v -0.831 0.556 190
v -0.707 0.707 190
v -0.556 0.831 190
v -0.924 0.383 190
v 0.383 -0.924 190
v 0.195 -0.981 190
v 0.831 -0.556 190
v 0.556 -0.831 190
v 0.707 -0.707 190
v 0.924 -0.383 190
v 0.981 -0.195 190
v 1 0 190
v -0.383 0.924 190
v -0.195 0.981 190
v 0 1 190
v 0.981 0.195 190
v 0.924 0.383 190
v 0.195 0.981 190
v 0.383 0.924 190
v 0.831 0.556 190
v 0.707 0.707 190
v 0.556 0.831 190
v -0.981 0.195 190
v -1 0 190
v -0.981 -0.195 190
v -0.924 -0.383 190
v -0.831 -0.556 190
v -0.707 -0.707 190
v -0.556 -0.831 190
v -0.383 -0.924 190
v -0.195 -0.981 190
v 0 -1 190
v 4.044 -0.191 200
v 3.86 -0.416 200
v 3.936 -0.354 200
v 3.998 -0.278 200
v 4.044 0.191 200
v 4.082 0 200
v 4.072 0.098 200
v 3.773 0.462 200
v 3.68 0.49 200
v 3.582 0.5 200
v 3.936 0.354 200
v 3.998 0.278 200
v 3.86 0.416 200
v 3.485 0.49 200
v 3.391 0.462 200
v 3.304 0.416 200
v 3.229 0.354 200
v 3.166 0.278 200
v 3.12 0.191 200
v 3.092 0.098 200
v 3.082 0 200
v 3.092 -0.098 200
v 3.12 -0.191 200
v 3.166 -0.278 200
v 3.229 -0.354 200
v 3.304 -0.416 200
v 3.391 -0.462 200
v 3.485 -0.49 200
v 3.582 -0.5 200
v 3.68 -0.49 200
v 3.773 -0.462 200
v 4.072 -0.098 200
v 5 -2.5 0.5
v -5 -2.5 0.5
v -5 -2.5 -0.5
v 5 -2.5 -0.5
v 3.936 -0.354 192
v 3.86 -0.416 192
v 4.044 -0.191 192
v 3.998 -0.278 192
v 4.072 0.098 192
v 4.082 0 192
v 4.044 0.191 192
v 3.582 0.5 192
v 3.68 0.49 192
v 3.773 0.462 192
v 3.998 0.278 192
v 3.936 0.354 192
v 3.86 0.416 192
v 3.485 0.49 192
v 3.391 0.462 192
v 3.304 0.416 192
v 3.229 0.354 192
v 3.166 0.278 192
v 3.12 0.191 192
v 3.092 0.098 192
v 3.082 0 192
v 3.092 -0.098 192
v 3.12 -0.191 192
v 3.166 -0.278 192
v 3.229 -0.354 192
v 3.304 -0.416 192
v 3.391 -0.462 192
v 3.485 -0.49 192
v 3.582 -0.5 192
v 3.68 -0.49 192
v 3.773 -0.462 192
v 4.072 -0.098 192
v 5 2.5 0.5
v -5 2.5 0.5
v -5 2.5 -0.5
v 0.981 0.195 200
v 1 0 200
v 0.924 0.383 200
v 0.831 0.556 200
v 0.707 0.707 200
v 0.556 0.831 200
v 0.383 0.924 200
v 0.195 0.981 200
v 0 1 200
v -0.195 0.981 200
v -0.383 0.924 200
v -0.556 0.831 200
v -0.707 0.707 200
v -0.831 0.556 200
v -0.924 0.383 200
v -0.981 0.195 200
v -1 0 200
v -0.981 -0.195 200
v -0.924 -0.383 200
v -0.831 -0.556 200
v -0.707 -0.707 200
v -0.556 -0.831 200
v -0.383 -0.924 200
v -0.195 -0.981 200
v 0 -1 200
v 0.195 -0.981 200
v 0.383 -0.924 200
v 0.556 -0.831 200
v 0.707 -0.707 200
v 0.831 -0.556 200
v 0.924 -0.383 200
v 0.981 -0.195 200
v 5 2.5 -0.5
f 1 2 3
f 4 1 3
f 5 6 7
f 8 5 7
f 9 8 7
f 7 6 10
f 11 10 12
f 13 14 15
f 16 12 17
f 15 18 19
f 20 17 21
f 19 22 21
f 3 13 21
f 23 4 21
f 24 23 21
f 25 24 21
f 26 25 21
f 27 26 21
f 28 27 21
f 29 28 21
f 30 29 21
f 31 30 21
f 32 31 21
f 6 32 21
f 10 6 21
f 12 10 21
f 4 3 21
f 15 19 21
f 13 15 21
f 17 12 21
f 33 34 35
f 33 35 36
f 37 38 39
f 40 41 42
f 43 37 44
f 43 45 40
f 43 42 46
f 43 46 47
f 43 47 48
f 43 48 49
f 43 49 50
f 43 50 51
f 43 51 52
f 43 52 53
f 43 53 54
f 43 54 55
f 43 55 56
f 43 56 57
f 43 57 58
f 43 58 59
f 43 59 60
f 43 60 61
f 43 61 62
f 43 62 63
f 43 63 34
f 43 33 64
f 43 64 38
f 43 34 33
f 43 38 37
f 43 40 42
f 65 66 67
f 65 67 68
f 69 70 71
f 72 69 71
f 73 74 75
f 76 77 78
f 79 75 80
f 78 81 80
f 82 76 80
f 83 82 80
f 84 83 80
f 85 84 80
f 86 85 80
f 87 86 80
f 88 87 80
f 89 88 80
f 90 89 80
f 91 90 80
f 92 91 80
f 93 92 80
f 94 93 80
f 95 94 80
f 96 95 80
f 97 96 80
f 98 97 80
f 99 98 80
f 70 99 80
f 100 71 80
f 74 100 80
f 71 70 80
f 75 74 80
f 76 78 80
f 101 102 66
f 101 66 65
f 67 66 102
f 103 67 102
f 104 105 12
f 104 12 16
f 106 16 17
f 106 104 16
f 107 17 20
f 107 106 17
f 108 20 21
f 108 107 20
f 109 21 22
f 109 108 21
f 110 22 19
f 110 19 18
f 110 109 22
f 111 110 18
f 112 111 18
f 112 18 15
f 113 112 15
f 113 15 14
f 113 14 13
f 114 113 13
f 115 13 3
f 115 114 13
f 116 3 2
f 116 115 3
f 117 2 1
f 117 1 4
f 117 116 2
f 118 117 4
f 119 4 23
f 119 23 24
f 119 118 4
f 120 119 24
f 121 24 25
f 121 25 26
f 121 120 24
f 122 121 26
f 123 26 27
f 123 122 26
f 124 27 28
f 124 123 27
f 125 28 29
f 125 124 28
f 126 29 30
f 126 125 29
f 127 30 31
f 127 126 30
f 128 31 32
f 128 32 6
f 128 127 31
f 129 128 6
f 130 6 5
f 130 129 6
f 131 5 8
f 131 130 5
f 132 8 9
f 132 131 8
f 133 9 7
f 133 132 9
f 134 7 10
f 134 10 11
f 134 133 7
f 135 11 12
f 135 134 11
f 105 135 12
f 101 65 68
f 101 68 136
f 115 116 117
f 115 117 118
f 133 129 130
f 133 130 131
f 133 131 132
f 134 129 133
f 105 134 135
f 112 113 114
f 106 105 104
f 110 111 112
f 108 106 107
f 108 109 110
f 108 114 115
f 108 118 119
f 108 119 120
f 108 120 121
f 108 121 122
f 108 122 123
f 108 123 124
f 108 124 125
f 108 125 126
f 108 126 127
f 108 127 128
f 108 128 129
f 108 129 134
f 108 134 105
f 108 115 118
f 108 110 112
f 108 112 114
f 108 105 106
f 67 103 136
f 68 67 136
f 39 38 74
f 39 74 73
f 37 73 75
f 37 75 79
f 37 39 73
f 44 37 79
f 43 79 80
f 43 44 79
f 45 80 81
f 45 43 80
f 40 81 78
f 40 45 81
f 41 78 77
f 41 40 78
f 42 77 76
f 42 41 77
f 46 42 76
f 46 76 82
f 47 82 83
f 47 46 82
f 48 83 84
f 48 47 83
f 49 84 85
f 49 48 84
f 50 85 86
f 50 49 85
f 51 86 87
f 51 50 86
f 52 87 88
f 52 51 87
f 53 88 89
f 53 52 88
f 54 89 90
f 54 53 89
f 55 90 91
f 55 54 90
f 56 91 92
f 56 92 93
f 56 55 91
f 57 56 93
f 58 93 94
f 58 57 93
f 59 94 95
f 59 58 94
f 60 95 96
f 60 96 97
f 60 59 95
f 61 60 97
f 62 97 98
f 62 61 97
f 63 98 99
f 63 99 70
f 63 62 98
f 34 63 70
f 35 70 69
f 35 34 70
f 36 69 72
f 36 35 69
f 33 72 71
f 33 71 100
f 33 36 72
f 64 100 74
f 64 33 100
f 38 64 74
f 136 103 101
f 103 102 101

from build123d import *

# Parameters (mm, degrees)
F0_W     = 10
F0_H     = 5
F1_DEPTH = 0.5
F3_R     = 1
F4_DEPTH = 10
F3_R_2   = 0.5
F5_DEPTH = 8


with BuildPart() as f1:
    # F0 (on Top) → F1 (new body, symmetric)
    with BuildSketch(Plane.XY):
        Rectangle(F0_W, F0_H)
    extrude(amount=F1_DEPTH, both=True)


with BuildPart() as f4:
    # F3 (on offset) → F4 (new body)
    with BuildSketch(Plane.XY.offset(200)):
        Circle(F3_R)
    extrude(amount=-F4_DEPTH)


with BuildPart() as f5:
    # F3 (on offset) → F5 (new body)
    with BuildSketch(Plane.XY.offset(200)):
        with Locations((3.582082, 0)):
            Circle(F3_R_2)
    extrude(amount=-F5_DEPTH)


solid = Compound([f1.part, f4.part, f5.part])
